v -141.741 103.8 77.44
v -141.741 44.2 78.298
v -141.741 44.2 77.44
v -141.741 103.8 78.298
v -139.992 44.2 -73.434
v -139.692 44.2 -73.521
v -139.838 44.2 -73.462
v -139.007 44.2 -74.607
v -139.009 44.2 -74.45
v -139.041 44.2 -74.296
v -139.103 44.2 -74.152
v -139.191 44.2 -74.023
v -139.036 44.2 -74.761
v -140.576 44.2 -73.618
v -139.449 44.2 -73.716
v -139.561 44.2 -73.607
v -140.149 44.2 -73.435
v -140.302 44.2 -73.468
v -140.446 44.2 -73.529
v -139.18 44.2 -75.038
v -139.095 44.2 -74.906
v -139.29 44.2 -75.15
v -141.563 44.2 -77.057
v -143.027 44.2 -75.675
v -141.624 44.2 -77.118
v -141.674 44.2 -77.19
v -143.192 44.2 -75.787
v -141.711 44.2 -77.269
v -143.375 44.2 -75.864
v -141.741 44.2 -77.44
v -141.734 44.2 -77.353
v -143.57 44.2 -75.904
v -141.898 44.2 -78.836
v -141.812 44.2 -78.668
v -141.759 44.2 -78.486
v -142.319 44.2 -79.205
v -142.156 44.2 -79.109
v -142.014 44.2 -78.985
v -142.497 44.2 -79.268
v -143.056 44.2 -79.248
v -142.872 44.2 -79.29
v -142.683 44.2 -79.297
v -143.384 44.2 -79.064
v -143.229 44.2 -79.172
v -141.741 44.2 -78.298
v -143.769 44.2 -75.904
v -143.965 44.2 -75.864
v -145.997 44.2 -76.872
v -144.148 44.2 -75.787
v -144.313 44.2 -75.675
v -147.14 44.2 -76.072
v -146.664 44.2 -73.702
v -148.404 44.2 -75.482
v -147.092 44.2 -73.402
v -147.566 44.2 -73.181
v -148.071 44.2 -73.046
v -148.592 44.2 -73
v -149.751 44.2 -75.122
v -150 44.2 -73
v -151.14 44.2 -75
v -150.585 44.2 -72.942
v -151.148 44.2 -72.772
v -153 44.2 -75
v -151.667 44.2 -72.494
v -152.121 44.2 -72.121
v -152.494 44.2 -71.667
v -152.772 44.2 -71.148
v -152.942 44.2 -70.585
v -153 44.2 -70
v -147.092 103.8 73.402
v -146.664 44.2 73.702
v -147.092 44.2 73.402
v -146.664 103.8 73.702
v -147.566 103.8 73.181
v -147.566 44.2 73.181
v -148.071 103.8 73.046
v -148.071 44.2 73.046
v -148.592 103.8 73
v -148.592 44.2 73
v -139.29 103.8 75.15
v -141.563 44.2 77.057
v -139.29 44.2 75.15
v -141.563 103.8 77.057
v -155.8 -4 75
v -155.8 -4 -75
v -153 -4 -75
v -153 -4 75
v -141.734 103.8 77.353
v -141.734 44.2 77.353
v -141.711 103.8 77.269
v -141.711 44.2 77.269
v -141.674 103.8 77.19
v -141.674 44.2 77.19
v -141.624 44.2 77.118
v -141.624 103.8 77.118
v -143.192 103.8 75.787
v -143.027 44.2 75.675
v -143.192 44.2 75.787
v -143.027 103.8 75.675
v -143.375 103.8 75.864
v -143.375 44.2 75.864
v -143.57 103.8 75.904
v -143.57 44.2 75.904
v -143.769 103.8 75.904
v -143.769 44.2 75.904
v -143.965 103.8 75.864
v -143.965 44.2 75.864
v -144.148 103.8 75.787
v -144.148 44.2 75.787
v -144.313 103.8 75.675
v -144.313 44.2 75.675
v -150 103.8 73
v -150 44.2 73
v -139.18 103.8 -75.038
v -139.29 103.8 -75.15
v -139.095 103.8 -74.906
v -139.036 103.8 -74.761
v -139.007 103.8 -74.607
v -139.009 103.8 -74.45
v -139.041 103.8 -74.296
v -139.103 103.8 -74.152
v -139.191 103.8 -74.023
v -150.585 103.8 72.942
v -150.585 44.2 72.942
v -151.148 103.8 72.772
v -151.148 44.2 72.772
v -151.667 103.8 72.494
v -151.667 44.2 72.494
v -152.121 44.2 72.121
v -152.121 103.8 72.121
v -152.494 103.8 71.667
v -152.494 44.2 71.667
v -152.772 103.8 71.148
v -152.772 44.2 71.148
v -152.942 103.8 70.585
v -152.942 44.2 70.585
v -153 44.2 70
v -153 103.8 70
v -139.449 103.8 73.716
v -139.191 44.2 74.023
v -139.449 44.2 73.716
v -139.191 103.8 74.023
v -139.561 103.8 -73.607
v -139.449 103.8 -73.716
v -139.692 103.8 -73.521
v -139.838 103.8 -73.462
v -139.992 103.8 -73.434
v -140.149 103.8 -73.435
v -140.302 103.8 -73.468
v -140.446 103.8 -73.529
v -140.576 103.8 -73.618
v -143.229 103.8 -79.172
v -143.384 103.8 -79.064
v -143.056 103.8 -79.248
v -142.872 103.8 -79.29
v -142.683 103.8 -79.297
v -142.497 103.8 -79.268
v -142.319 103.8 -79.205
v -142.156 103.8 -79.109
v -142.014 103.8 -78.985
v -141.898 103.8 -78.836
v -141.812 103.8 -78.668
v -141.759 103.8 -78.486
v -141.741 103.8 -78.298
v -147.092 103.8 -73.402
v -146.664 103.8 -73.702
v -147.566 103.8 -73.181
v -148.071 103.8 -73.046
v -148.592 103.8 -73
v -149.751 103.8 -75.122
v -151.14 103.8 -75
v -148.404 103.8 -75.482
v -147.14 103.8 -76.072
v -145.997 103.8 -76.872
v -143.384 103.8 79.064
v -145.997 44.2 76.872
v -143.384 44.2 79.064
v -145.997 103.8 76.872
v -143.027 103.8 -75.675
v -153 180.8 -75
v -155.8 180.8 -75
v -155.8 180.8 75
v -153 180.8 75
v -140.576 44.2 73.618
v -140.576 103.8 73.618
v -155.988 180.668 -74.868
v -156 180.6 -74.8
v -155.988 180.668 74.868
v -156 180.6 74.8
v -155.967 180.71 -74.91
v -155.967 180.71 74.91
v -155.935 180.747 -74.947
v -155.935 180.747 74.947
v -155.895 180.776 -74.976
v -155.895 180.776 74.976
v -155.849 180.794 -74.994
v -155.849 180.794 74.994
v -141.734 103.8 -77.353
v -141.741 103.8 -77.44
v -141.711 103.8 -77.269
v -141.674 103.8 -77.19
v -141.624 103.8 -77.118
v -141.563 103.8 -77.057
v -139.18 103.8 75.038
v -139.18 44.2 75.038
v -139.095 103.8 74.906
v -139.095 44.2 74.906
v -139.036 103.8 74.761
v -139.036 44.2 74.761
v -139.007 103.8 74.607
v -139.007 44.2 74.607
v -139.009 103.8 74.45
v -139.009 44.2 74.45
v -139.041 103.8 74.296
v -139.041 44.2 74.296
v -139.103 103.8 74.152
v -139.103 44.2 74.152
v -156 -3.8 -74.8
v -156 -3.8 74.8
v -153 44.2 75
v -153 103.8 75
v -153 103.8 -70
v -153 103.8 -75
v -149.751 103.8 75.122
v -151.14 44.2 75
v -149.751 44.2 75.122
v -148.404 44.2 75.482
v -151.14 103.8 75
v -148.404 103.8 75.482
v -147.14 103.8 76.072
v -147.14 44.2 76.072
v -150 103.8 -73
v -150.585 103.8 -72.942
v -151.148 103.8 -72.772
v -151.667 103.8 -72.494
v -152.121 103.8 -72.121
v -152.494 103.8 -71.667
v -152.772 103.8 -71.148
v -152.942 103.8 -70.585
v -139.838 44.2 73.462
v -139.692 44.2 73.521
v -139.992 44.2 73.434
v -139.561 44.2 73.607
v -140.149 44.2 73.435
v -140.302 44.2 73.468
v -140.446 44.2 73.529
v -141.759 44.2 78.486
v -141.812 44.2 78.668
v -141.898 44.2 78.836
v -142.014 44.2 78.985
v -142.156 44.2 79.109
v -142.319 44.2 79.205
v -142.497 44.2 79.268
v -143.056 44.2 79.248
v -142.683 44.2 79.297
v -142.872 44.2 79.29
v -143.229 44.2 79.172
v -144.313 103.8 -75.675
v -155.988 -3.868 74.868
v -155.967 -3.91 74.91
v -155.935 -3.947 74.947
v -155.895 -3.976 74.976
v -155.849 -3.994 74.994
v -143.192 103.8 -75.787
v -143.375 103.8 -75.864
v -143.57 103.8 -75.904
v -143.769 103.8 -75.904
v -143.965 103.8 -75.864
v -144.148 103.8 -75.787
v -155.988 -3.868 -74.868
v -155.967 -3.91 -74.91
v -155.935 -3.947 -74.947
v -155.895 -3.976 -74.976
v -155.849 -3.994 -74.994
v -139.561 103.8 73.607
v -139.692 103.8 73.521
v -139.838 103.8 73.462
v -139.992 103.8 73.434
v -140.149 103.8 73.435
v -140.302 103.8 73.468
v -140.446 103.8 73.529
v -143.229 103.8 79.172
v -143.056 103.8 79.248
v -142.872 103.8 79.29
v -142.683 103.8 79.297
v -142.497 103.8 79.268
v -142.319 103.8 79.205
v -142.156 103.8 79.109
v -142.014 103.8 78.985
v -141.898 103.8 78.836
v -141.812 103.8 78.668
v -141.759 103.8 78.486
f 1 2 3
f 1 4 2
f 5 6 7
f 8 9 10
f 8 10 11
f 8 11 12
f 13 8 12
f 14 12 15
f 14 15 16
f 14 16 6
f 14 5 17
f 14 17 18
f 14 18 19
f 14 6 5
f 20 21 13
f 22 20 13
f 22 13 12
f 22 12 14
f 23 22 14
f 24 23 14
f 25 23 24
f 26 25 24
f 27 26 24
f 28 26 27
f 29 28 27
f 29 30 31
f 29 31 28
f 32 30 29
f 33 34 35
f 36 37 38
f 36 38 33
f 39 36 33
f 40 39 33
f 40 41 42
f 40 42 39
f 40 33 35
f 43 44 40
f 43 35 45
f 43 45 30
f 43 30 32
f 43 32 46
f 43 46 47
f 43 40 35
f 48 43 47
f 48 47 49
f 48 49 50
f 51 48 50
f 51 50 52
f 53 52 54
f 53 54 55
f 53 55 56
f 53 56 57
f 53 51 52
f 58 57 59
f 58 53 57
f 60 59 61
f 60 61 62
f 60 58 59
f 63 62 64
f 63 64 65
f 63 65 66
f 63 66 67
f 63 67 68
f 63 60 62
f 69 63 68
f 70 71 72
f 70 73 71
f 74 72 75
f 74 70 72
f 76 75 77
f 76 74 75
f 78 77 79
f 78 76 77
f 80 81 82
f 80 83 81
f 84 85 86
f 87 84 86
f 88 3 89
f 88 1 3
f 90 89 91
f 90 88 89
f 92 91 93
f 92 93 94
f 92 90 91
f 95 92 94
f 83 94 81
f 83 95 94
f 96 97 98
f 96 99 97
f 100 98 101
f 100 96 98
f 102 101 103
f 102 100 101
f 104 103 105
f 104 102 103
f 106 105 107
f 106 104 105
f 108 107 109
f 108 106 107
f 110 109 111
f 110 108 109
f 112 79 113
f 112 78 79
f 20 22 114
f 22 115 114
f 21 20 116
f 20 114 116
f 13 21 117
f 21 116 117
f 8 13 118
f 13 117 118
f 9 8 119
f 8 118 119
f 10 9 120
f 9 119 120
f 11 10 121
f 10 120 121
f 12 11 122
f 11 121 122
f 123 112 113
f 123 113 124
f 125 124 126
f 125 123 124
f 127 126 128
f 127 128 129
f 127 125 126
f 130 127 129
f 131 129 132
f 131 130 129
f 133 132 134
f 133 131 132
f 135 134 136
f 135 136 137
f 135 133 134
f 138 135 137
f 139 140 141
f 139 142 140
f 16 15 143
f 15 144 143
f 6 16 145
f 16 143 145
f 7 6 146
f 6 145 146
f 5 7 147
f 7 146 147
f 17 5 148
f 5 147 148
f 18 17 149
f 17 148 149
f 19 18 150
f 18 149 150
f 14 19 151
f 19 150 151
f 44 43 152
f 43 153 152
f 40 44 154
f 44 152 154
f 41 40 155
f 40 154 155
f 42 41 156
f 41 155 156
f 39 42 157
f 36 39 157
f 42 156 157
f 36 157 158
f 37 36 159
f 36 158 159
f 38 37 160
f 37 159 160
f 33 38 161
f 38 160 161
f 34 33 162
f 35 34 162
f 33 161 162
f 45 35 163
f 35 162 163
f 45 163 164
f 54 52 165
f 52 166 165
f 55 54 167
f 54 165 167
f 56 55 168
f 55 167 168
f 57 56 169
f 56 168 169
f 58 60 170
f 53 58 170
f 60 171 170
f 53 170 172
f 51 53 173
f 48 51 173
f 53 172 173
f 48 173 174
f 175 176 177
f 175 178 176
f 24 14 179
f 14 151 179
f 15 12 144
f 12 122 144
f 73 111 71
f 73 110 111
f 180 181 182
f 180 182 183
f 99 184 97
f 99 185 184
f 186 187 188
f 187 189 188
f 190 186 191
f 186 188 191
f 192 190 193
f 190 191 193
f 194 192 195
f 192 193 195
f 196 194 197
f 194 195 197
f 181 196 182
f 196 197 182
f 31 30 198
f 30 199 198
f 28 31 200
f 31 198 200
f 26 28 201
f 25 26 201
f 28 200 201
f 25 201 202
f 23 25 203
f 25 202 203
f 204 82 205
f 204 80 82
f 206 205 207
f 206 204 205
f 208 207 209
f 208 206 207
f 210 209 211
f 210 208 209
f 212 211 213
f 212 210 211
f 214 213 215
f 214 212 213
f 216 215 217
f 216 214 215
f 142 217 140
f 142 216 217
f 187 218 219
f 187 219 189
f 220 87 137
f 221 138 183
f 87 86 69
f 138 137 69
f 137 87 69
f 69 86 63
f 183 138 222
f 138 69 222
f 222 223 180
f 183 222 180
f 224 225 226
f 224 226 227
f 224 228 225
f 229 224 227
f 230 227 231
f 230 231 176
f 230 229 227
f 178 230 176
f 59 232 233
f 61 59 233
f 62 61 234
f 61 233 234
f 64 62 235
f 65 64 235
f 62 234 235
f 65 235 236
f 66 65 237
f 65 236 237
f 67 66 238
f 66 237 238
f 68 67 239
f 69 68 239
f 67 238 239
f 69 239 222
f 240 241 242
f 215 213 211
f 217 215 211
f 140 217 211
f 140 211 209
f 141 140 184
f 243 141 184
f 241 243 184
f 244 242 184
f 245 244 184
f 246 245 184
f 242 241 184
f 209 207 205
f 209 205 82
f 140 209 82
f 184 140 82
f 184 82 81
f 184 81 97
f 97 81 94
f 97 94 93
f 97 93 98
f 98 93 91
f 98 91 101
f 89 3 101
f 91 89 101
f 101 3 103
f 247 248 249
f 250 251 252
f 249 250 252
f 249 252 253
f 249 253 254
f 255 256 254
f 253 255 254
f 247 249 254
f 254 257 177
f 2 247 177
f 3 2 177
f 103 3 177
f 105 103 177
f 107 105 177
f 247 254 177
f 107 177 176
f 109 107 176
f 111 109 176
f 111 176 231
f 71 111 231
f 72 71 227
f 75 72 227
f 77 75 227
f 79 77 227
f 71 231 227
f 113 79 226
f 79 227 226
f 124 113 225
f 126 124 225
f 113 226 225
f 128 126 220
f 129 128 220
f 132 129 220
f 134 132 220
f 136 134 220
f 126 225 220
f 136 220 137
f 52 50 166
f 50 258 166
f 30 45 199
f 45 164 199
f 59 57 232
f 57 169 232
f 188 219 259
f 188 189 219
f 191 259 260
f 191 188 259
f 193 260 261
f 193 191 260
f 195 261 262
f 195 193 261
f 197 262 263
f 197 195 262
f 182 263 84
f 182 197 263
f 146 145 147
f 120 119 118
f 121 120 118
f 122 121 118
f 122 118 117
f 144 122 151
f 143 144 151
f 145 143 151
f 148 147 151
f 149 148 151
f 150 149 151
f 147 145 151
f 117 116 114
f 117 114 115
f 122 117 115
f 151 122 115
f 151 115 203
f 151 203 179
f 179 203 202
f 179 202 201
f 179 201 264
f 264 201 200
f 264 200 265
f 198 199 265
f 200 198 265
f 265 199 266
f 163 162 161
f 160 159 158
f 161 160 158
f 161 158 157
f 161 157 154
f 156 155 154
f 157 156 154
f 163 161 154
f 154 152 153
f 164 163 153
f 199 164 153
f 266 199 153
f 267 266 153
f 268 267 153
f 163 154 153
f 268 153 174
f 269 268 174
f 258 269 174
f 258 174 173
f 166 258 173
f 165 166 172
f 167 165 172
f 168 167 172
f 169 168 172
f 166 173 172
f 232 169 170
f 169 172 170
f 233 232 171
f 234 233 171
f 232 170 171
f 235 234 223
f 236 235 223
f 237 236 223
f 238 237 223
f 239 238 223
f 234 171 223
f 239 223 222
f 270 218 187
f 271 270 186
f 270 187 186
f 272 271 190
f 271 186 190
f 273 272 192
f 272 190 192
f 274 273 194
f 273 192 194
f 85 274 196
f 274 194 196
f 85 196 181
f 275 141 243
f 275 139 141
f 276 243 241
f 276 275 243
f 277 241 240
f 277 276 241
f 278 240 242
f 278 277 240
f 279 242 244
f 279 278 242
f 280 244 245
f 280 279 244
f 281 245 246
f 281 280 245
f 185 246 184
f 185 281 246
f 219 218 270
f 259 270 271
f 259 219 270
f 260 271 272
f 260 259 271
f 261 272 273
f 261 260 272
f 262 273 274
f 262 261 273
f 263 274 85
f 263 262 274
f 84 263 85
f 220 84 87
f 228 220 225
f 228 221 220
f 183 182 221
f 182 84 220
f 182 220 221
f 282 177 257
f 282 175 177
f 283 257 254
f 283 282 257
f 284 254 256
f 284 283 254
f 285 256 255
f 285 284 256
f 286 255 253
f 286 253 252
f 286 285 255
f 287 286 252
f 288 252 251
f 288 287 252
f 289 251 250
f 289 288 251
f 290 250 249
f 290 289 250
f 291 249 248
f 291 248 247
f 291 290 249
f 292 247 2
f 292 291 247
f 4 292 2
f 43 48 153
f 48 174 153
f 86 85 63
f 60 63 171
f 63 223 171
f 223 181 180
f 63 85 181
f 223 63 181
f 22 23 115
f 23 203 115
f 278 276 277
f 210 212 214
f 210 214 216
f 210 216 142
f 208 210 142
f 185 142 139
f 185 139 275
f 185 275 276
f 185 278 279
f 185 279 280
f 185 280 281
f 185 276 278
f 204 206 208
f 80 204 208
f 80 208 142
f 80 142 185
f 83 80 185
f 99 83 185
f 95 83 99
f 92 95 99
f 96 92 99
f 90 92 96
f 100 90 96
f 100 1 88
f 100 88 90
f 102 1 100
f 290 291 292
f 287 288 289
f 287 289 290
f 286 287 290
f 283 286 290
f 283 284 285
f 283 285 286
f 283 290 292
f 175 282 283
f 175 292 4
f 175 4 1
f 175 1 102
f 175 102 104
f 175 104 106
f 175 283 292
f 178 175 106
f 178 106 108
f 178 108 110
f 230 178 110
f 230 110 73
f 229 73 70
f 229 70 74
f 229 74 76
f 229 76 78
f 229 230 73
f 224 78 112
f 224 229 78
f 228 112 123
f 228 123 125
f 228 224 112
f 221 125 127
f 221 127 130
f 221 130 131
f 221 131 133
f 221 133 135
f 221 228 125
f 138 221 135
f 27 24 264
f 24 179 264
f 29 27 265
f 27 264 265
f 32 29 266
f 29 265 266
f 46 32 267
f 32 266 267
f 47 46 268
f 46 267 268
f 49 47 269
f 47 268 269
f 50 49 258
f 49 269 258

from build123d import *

# Parameters (mm, degrees)
STOCK_OUTTER_CASE_1_START     = -75
STOCK_OUTTER_CASE_1_OUTLINE_W = 3
STOCK_OUTTER_CASE_1_OUTLINE_H = 184.8
STOCK_OUTTER_CASE_1_DEPTH     = 150
FILLET1_R                     = 0.2
BOSS_EXTRUDE1_DEPTH           = 29.8


# Read off the part's stored shape, not the designer's step: Stock-outter_case-1
with BuildPart() as part:
    # Stock-outter_case-1 outline → Stock-outter_case-1 (new body)
    with BuildSketch(Plane.XY.offset(STOCK_OUTTER_CASE_1_START)):
        with Locations((-154.5, 88.4)):
            Rectangle(STOCK_OUTTER_CASE_1_OUTLINE_W, STOCK_OUTTER_CASE_1_OUTLINE_H)
    extrude(amount=STOCK_OUTTER_CASE_1_DEPTH)

    # Fillet1
    fillet1_edges = [part.edges().sort_by_distance(p)[0] for p in [
        (-156, 180.8, 0),
        (-156, -4, 0),
        (-156, 88.4, 75),
        (-156, 88.4, -75),
    ]]
    fillet(fillet1_edges, radius=FILLET1_R)

    # Sketch1 → Boss-Extrude1 (add, symmetric)
    with BuildSketch(Plane(origin=(0, 74, 0), x_dir=(1, 0, 0), z_dir=(0, 1, 0))):
        with BuildLine():
            Line((-153, 75), (-151.139702343, 75))
            ThreePointArc((-151.139702343, 75), (-148.403541196, 75.482459034), (-145.997401465, 76.871644455))
            Line((-145.997401465, 76.871644455), (-143.384202565, 79.064378688))
            ThreePointArc((-143.384202565, 79.064378688), (-142.318796694, 79.204642032), (-141.741414955, 78.298334245))
            Line((-141.741414955, 78.298334245), (-141.741414955, 77.439817918))
            ThreePointArc((-141.741414955, 77.439817918), (-141.694568849, 77.228508787), (-141.56280876, 77.056795696))
            Line((-141.56280876, 77.056795696), (-139.290072737, 75.149743737))
            ThreePointArc((-139.290072737, 75.149743737), (-139.007347067, 74.606632777), (-139.191467271, 74.022678095))
            Line((-139.191467271, 74.022678095), (-139.448582314, 73.716260318))
            ThreePointArc((-139.448582314, 73.716260318), (-139.991693275, 73.433534647), (-140.575647957, 73.617654851))
            Line((-140.575647957, 73.617654851), (-143.026990175, 75.674575202))
            ThreePointArc((-143.026990175, 75.674575202), (-143.669777784, 75.908530759), (-144.312565394, 75.674575202))
            Line((-144.312565394, 75.674575202), (-146.663547874, 73.701866671))
            ThreePointArc((-146.663547874, 73.701866671), (-147.565850273, 73.180922138), (-148.591910703, 73))
            Line((-148.591910703, 73), (-150, 73))
            ThreePointArc((-150, 73), (-152.121320344, 72.121320344), (-153, 70))
            Line((-153, 70), (-153, 75))
        make_face()
    boss_extrude1 = extrude(amount=BOSS_EXTRUDE1_DEPTH, both=True)

    # Mirror1: Boss-Extrude1 across plane
    add(boss_extrude1.mirror(Plane.XY))


solid = part.part
